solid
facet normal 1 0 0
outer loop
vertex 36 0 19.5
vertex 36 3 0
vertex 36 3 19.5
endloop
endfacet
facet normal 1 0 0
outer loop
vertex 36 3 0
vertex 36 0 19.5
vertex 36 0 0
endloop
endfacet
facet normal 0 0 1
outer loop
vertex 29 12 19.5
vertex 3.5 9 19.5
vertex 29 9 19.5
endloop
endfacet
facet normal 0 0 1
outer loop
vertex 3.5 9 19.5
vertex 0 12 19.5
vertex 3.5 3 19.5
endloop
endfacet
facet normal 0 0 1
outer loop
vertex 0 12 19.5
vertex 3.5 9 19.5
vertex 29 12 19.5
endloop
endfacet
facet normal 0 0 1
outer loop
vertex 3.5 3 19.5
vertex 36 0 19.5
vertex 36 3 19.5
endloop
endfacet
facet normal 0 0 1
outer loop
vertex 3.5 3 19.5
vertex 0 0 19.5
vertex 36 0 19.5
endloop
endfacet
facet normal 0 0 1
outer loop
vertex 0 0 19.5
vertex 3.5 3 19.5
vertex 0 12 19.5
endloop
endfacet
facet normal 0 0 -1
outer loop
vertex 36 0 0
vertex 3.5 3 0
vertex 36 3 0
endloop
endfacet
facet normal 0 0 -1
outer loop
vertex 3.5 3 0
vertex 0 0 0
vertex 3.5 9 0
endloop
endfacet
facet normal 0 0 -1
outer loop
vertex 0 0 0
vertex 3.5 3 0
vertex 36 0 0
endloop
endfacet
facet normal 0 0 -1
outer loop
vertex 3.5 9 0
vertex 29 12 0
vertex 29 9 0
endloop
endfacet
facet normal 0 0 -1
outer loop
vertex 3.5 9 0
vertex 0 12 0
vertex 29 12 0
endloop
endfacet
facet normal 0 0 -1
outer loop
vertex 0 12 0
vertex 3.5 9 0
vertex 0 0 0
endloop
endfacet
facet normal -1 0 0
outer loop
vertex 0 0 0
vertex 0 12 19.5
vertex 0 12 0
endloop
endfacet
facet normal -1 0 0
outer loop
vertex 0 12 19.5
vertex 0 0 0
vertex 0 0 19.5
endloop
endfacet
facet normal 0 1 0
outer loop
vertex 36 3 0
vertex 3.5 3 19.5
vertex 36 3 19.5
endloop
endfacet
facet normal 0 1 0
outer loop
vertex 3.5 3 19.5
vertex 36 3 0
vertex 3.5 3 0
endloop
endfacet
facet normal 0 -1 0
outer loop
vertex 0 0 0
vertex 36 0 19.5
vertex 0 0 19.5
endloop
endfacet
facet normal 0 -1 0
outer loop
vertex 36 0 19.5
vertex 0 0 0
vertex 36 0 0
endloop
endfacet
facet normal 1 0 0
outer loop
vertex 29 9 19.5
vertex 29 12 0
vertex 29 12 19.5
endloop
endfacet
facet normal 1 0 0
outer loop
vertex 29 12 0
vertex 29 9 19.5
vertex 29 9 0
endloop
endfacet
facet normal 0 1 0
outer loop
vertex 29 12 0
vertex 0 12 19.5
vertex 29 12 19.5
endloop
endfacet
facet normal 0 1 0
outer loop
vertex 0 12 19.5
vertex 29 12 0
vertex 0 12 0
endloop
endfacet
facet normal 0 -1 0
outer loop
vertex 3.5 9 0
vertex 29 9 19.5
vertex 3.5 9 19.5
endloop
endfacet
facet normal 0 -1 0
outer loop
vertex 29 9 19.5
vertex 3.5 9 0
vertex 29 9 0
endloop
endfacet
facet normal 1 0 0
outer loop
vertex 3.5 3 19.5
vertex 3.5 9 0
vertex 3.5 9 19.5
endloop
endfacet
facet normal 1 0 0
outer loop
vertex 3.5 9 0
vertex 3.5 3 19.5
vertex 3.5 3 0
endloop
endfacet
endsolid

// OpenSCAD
h=19.5;

cube([36, 3, h]);
translate([0, 9, 0])
  cube([29, 3, h]);
cube([3.5, 9, h]);
